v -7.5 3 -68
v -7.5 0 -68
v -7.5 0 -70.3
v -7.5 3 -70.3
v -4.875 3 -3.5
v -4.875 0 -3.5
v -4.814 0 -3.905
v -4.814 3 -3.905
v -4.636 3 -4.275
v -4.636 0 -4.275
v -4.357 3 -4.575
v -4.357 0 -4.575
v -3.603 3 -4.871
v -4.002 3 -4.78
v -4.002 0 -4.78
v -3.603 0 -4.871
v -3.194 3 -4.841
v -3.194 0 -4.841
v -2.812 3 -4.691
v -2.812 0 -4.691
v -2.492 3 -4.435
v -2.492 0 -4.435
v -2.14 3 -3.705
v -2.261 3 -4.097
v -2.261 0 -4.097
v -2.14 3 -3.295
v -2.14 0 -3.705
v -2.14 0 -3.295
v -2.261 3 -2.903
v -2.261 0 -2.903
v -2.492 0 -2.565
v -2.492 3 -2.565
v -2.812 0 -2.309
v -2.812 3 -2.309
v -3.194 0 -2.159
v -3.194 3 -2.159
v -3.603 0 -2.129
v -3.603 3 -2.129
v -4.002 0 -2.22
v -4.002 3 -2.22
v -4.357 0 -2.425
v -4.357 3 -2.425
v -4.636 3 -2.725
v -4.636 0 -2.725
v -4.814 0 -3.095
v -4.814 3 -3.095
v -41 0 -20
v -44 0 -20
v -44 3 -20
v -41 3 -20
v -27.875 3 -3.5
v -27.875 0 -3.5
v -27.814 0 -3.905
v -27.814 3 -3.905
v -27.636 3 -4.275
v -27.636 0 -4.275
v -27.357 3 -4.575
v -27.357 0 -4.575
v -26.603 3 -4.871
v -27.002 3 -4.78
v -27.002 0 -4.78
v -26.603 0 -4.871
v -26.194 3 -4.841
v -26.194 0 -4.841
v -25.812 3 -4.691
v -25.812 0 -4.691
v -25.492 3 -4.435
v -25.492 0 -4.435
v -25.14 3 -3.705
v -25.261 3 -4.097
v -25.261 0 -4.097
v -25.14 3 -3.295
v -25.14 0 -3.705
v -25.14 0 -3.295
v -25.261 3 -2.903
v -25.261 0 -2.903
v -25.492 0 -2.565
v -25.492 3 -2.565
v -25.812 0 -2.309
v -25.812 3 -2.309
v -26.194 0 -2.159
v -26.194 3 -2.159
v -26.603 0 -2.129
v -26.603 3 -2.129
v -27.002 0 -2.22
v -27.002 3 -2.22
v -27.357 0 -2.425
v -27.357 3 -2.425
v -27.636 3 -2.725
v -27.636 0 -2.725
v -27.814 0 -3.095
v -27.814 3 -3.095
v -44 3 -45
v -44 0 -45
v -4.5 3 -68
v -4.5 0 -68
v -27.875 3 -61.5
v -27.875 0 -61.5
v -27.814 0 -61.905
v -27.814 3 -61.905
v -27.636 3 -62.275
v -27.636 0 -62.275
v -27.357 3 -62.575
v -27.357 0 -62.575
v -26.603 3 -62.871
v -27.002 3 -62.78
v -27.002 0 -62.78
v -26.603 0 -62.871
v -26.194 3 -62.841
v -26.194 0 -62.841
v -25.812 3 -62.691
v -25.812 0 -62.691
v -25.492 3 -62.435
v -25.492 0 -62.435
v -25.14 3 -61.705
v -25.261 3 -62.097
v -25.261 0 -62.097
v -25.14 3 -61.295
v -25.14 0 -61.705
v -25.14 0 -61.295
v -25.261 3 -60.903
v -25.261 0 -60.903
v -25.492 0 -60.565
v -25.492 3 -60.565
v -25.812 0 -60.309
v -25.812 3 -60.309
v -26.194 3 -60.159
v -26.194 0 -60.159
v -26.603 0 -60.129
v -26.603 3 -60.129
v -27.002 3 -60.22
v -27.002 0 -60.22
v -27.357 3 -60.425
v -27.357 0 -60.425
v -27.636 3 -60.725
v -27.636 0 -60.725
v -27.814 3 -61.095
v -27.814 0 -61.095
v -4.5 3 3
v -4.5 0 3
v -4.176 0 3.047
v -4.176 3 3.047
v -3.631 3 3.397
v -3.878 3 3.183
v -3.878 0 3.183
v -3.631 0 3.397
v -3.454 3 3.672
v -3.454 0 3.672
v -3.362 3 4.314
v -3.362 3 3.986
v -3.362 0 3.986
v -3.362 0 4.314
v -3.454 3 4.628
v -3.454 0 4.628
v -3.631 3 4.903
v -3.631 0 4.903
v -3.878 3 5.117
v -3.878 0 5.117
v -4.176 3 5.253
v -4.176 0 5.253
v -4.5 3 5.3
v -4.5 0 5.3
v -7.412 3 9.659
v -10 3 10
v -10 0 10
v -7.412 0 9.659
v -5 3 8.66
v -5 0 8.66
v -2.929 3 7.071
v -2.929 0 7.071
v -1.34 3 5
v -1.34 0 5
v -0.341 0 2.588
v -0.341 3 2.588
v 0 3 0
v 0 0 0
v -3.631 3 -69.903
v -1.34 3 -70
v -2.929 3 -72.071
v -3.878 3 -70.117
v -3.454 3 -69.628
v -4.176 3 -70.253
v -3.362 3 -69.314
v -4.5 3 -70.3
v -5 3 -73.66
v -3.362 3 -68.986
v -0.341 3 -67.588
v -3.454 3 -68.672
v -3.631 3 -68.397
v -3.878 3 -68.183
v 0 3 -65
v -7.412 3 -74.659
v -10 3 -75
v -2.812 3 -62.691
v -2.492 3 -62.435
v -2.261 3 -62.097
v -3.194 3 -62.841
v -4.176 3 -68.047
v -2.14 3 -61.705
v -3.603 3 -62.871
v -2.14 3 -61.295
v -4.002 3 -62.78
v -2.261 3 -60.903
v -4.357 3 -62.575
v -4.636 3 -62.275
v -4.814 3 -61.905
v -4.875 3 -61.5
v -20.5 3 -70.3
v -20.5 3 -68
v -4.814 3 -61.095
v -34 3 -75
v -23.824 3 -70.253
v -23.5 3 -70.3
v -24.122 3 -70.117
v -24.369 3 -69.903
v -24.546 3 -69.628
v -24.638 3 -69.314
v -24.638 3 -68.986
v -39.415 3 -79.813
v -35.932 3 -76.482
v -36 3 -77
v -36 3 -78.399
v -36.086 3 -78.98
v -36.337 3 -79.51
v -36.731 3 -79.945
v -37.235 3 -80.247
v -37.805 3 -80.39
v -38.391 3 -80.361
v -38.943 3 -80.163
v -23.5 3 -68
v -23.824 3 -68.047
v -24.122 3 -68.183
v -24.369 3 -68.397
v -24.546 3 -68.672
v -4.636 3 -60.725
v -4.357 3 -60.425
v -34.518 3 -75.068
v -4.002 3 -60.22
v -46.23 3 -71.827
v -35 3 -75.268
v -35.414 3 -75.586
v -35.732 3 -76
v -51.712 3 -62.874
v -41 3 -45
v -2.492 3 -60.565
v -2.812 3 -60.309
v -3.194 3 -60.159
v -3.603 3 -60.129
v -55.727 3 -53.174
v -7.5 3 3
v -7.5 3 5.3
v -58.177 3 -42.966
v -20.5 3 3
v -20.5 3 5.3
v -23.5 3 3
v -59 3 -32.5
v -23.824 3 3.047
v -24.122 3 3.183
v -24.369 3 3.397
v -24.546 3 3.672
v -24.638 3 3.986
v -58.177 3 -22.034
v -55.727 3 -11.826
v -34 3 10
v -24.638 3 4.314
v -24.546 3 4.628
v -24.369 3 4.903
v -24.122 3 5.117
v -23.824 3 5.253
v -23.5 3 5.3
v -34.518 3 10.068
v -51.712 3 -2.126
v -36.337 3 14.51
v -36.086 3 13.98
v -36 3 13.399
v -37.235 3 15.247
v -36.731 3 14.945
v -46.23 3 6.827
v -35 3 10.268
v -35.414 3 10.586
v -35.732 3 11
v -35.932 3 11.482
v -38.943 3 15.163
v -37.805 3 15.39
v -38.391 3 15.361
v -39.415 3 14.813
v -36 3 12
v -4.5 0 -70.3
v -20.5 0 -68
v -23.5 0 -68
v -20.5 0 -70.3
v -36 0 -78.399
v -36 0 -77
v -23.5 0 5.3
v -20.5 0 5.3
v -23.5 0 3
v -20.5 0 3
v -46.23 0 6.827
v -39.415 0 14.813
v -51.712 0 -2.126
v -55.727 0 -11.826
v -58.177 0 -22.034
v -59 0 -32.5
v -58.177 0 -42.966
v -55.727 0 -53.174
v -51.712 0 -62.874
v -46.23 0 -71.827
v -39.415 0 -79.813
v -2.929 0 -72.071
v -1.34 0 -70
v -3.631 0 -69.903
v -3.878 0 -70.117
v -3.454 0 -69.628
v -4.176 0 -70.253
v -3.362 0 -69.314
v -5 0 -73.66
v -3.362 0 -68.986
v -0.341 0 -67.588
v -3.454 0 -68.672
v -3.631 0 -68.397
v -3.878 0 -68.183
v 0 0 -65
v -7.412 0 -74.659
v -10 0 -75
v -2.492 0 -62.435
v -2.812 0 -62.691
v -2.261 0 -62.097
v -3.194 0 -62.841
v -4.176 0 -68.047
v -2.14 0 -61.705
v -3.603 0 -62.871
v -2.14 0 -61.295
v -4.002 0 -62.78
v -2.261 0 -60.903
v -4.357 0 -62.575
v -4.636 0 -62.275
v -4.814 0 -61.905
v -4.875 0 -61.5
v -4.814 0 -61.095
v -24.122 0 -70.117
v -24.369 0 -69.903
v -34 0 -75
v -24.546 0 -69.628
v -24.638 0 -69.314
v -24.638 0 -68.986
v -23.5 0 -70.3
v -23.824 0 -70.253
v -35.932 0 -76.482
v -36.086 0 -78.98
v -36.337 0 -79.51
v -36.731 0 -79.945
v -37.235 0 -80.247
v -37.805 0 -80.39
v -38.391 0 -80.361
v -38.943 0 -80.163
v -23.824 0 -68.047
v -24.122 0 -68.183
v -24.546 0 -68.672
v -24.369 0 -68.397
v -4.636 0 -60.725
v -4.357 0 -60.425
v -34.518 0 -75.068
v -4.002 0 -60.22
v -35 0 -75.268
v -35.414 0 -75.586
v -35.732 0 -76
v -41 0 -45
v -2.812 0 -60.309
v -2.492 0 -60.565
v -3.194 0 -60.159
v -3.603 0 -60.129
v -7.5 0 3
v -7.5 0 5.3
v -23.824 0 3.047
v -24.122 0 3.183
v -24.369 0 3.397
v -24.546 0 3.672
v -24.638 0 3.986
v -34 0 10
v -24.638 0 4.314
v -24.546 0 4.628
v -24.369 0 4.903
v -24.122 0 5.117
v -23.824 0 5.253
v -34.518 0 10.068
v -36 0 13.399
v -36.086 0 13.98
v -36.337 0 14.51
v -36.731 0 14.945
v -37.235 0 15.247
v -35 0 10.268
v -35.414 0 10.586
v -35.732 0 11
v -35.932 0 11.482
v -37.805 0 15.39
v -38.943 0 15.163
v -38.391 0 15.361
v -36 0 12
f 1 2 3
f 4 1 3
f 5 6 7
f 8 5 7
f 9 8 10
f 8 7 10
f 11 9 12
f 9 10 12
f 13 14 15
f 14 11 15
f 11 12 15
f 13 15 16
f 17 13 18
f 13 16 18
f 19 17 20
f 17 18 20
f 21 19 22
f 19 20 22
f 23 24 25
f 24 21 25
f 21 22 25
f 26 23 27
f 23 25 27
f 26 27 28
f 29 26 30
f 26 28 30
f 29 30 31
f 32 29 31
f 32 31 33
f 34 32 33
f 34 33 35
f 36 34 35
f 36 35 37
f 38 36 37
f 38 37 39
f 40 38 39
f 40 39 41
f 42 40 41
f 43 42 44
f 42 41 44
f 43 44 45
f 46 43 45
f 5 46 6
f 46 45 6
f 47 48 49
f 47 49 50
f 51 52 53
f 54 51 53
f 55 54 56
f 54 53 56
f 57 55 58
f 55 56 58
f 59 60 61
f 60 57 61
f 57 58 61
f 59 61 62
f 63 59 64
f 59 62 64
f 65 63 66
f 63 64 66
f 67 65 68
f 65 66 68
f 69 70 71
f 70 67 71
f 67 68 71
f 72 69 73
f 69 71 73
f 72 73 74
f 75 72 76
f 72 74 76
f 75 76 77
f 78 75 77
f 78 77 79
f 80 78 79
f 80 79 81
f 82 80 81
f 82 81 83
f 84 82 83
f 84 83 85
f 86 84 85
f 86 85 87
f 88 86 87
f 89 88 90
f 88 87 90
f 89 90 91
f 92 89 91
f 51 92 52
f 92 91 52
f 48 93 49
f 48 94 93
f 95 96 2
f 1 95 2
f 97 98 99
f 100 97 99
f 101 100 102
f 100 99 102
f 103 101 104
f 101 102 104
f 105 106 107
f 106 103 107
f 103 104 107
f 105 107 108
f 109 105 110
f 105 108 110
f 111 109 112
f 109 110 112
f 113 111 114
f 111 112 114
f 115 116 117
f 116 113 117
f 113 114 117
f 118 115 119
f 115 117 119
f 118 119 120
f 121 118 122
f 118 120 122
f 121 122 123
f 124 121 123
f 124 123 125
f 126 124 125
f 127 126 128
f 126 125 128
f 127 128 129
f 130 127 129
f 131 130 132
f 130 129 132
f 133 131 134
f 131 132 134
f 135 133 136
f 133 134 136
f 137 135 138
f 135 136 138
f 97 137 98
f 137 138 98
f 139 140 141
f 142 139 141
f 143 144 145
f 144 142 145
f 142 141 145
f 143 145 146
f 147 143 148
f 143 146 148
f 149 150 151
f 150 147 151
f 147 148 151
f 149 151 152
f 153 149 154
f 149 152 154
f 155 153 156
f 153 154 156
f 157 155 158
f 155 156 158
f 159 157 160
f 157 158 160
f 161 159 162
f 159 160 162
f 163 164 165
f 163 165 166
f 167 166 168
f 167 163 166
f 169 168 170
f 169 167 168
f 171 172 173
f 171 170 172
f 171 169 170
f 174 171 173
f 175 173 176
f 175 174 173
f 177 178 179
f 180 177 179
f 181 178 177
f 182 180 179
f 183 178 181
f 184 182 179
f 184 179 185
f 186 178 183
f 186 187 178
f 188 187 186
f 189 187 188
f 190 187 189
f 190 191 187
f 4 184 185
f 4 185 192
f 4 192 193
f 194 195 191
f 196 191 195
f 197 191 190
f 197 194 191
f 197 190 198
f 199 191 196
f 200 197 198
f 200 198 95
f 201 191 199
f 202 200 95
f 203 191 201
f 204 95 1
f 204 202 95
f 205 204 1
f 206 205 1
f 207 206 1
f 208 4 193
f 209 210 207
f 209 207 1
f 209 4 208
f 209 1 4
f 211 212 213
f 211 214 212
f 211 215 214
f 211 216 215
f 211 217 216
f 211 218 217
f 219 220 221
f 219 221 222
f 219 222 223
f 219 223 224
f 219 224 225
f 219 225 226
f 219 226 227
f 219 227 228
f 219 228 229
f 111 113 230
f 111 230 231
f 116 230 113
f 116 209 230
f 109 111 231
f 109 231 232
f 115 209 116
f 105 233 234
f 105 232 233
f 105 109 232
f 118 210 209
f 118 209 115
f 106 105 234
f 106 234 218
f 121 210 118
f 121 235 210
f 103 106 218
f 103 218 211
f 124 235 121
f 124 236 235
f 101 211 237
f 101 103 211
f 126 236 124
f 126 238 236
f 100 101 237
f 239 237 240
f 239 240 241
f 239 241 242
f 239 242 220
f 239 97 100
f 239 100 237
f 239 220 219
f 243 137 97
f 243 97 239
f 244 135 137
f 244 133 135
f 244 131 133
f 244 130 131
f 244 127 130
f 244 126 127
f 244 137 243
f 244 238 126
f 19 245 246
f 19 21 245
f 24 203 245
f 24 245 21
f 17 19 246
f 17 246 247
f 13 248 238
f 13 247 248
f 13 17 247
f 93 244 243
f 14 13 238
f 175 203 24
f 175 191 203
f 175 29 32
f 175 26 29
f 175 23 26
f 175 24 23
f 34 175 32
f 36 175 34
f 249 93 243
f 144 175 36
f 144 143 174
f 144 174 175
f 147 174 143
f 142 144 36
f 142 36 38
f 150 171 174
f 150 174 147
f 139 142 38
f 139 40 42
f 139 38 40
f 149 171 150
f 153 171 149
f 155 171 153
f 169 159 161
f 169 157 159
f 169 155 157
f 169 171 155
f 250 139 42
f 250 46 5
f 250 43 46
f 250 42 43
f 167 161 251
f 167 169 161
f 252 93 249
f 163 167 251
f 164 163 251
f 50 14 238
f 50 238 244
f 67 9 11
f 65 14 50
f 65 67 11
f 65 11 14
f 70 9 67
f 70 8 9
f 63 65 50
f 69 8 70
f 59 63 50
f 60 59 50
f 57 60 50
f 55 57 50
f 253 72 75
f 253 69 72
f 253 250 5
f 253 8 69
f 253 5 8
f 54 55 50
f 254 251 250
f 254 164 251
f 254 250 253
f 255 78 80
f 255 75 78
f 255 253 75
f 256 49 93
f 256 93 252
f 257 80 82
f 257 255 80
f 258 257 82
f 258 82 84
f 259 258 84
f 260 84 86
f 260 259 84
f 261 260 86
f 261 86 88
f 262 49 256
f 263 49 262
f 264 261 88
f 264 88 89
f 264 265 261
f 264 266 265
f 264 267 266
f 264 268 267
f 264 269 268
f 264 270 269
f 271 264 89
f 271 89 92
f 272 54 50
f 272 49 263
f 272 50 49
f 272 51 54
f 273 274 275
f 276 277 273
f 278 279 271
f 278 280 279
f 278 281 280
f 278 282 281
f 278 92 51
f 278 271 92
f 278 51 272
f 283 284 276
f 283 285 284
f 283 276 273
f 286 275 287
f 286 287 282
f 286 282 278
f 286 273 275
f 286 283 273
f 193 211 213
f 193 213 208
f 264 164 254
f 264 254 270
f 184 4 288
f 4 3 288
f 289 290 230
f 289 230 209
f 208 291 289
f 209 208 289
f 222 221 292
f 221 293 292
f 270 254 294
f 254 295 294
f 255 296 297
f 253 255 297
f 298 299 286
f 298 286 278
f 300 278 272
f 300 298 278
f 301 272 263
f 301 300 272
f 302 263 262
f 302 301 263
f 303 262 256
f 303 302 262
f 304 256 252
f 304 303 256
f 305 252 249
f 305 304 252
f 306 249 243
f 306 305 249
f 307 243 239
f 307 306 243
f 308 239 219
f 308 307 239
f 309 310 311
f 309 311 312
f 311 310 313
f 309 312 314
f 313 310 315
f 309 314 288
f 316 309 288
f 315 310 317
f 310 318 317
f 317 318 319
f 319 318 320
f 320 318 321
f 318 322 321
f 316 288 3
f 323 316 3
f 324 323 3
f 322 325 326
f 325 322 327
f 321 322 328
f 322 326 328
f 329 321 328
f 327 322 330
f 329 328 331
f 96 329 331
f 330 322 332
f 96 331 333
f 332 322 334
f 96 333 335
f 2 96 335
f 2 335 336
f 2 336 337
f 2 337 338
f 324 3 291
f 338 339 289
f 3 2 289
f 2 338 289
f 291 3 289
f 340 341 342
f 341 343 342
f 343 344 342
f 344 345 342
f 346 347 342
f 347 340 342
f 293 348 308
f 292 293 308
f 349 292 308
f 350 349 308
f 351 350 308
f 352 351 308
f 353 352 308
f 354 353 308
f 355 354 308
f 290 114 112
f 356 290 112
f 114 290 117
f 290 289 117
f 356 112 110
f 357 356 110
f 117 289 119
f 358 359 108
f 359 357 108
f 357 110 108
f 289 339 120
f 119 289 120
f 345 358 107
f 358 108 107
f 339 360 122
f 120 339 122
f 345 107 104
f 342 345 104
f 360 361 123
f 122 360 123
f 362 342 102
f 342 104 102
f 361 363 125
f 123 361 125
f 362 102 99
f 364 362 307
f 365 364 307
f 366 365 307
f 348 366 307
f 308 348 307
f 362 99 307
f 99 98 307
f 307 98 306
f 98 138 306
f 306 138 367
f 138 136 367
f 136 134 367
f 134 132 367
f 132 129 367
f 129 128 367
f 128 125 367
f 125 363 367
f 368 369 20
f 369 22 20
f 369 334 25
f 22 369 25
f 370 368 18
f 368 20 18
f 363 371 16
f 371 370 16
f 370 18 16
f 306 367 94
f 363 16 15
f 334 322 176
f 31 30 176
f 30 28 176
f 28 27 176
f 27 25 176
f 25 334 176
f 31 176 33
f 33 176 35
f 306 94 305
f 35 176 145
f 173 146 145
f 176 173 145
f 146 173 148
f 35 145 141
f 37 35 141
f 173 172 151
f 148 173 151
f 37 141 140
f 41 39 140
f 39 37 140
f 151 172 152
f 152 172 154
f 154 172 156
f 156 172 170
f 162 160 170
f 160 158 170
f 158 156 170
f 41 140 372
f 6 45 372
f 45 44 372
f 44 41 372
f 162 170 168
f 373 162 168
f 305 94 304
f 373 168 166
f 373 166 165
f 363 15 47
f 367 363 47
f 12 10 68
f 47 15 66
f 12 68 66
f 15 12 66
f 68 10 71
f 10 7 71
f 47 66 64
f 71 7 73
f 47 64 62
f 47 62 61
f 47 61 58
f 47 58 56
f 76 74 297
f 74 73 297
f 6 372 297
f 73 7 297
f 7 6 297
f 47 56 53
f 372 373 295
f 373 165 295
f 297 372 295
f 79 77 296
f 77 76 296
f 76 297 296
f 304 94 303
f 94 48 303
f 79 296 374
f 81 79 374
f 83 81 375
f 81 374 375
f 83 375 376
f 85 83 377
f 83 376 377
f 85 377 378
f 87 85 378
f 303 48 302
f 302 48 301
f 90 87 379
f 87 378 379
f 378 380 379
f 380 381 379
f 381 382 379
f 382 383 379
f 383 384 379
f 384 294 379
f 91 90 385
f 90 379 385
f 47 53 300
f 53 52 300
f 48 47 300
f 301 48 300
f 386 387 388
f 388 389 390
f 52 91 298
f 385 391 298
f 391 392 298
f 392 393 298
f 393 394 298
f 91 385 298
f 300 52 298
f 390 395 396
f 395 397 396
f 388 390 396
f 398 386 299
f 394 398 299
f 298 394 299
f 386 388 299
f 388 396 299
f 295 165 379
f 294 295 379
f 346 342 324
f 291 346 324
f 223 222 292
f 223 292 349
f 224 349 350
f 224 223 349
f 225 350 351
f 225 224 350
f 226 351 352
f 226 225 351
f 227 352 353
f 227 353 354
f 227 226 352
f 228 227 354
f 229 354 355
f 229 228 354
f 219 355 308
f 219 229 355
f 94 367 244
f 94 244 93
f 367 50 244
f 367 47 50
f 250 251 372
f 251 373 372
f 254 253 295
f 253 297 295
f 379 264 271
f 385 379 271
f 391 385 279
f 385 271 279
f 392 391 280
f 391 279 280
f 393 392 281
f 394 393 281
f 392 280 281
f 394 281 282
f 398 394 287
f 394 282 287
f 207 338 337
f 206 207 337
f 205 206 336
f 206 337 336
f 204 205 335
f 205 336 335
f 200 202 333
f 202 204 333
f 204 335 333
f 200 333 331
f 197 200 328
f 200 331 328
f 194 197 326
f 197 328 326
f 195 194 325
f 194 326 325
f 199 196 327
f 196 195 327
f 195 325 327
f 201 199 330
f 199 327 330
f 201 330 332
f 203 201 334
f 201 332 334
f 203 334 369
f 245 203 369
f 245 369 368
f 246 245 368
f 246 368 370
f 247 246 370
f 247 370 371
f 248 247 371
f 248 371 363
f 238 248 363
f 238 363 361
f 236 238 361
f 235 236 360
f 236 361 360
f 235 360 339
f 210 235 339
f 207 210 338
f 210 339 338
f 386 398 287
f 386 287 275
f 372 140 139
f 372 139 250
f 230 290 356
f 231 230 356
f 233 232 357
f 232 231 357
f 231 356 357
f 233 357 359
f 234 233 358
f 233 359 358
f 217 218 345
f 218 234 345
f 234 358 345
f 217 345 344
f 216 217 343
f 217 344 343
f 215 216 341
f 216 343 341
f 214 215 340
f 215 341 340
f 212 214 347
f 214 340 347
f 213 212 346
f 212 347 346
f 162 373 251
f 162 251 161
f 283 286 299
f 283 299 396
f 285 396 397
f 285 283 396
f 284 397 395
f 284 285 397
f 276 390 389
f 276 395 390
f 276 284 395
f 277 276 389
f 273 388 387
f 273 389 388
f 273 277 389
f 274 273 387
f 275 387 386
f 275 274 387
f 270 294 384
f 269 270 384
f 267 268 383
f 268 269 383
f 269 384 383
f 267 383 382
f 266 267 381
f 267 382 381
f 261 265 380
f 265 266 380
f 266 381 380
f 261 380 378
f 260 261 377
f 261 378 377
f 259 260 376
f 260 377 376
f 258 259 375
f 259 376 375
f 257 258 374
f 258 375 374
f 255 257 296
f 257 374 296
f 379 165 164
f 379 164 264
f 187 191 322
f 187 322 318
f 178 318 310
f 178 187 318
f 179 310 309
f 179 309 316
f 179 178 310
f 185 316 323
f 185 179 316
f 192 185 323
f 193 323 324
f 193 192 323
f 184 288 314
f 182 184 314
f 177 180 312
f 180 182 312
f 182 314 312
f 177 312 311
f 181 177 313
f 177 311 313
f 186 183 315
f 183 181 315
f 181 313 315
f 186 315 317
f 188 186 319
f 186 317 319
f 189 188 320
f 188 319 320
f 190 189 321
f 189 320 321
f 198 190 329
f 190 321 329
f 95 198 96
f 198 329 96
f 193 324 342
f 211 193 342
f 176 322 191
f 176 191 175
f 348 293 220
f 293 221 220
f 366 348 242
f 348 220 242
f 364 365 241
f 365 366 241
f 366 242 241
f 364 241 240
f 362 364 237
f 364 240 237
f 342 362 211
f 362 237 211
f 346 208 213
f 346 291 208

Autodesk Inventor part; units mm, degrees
ref_plane "YZ Plane" through (0, 0, 0) normal (1, 0, 0) x (0, 1, 0)
ref_plane "XZ Plane" through (0, 0, 0) normal (0, 1, 0) x (-1, 0, 0)
ref_plane "XY Plane" through (0, 0, 0) normal (0, 0, 1) x (1, 0, 0)
sketch "Boceto1" plane through (0, 0, 0) normal (0, 1, 0) x (-1, 0, 0)
  line L0 (3, 0) -> (33, 0)
  line L1 (36, -3) -> (36, -62)
  line L2 (33, -65) -> (3, -65)
  line L3 (0, -62) -> (0, -3)
  circle A0 centre (3.5, -61.5) radius 1.375
  arc A1 (36, -3) -> (33, 0) centre (33, -3) ccw
  arc A2 (3, 0) -> (0, -3) centre (3, -3) ccw
  arc A3 (0, -62) -> (3, -65) centre (3, -62) ccw
  arc A4 (33, -65) -> (36, -62) centre (33, -62) ccw
  circle A5 centre (26.5, -61.5) radius 1.375
  circle A6 centre (3.5, -3.5) radius 1.375
  circle A7 centre (26.5, -3.5) radius 1.375
  line L4 (36, 0) -> (0, 0)
  line L5 (0, 0) -> (0, 10)
  line L6 (0, 10) -> (36, 10)
  line L7 (36, 10) -> (36, 0)
  line L8 (36, -65) -> (0, -65)
  line L9 (0, -65) -> (0, -75)
  line L10 (0, -75) -> (36, -75)
  line L11 (36, -75) -> (36, -65)
  line L12 (7.5, 0) -> (20.5, 0)
  line L13 (20.5, 0) -> (20.5, 10)
  line L14 (20.5, 10) -> (7.5, 10)
  line L15 (7.5, 10) -> (7.5, 0)
  line L16 (7.5, 0) -> (20.5, 10) construction
  line L17 (20.5, 0) -> (7.5, 10) construction
  line L18 (7.5, -75) -> (20.5, -75)
  line L19 (20.5, -75) -> (20.5, -65)
  line L20 (20.5, -65) -> (7.5, -65)
  line L21 (7.5, -65) -> (7.5, -75)
  line L22 (7.5, -75) -> (20.5, -65) construction
  line L23 (20.5, -75) -> (7.5, -65) construction
  line L24 (36, -32.5) -> (0, -32.5)
  line L25 (36, 0) -> (36, -3)
  line L26 (0, 0) -> (0, -3)
  line L27 (0, -62) -> (0, -65)
  line L28 (36, -62) -> (36, -65)
  line L29 (36, -22.5) -> (49, -22.5)
  line L30 (49, -22.5) -> (49, -42.5)
  line L31 (49, -42.5) -> (36, -42.5)
  line L32 (36, -42.5) -> (36, -22.5)
  arc A8 (49, -42.5) -> (49, -22.5) centre (49, -32.5) ccw
  line L33 (20.5, 5.3) -> (23.5, 5.3)
  line L34 (23.5, 5.3) -> (23.5, 3)
  line L35 (23.5, 3) -> (20.5, 3)
  line L36 (20.5, 3) -> (20.5, 5.3)
  arc A9 (23.5, 3) -> (23.5, 5.3) centre (23.5, 4.15) ccw
  line L37 (14, 0) -> (14, -65)
  line L38 (7.5, 5.3) -> (4.5, 5.3)
  line L39 (4.5, 5.3) -> (4.5, 3)
  line L40 (4.5, 3) -> (7.5, 3)
  line L41 (7.5, 3) -> (7.5, 5.3)
  arc A10 (4.5, 5.3) -> (4.5, 3) centre (4.5, 4.15) ccw
  line L42 (20.5, -70.3) -> (23.5, -70.3)
  line L43 (23.5, -70.3) -> (23.5, -68)
  line L44 (23.5, -68) -> (20.5, -68)
  line L45 (20.5, -68) -> (20.5, -70.3)
  arc A11 (23.5, -70.3) -> (23.5, -68) centre (23.5, -69.15) ccw
  line L46 (4.5, -68) -> (7.5, -68)
  arc A12 (4.5, -68) -> (4.5, -70.3) centre (4.5, -69.15) ccw
  line L47 (7.5, -70.3) -> (4.5, -70.3)
  line L48 (4.5, -70.3) -> (4.5, -68)
  line L49 (7.5, -68) -> (7.5, -70.3)
  line L50 (36, 0) -> (49, 0)
  line L51 (49, 0) -> (49, -65)
  line L52 (49, -65) -> (36, -65)
  line L53 (36, -65) -> (36, 0)
  line L54 (44, -20) -> (41, -20)
  line L55 (41, -20) -> (41, -45)
  line L56 (41, -45) -> (44, -45)
  line L57 (44, -45) -> (44, -20)
  line L58 (36, 10) -> (36, 18)
  line L59 (36, -75) -> (36, -83)
  arc A13 (36, -83) -> (36, 18) centre (-7.9402, -32.5) ccw
  line L60 (0, -75) -> (-7, -75)
  line L61 (-7, -75) -> (-7, 10)
  line L62 (-7, 10) -> (0, 10)
  line L63 (0, 10) -> (0, -75)
  point P0 (14, 5)
  point P1 (14, -70)
  point P2 (36, -42.5)
  point P3 (7.5, -70.3)
  point P4 (20.5, -70.3)
  point P5 (7.5, 5.3)
  point P6 (20.5, 3)
  point P7 (44, -32.5)
  point P8 (36, -65)
  point P9 (44, -42.5)
  point P10 (41, -42.5)
  point P11 (41, -22.5)
  point P12 (44, -22.5)
  point P13 (49, -22.5)
  point P14 (59, -32.5)
  dimension "d0" = 36
  dimension "d1" = 65
  dimension "d2" = 2.75
  dimension "d3" = 3
  dimension "d4" = 3
  dimension "d5" = 3
  dimension "d6" = 3
  dimension "d7" = 3.5
  dimension "d8" = 3.5
  dimension "d11" = 23
  dimension "d14" = 58
  dimension "d17" = 10
  dimension "d18" = 10
  dimension "d19" = 13
  dimension "d20" = 10
  dimension "d21" = 13
  dimension "d22" = 10
  dimension "d26" = 7.5
  dimension "d30" = 20
  dimension "d31" = 13
  dimension "d32" = 3
  dimension "d33" = 2.3
  dimension "d34" = 3
  dimension "d35" = 1.15
  dimension "d36" = 13
  dimension "d37" = 3
  dimension "d38" = 25
  dimension "d39" = 5
  dimension "d42" = 8
  dimension "d43" = 8
  dimension "d46" = 7
extrude "Extrusión1" add sketch "Boceto1" along normal blind 3 contours L4 L5 L6 L15 L38 A10 L40 L0 | L0 L37 L24 L3 A2 | A2 L26 L4 | L15 L6 L13 L0 | L0 A1 L1 L24 L37 | L24 L37 L2 A3 L3 | L13 L35 A9 L33 L6 L7 L4 L0 | L24 L1 A4 L2 L37 | A3 L8 L27 | L4 L25 A1 | L1 L29 L55 L31 | L2 L19 L10 L21 | L2 L21 L46 A12 L47 L10 L9 L8 | L25 L50 L51 L29 L57 L54 L55 L1 | L7 L58 A13 A8 L51 L50 | L31 L55 L56 L57 L51 L52 L28 L1 | L2 L8 L11 L10 L19 L42 A11 L44 | L29 L57 L31 L55 | L28 L8 A4 | L30 L31 L57 L29 | A8 L30 | L52 L51 A8 A13 L59 L11
fillet "Empalme1" radius 10 2 edges at (0, 1.5, -75) (0, 1.5, 10)
extrude "Extrusión2" cut sketch "Boceto1" along normal blind 3 contours L29 L57 L31 L55
fillet "Empalme2" radius 2 4 edges at (-36, 1.5, -83) (-36, 1.5, 18) (-36, 1.5, 10) (-36, 1.5, -75)
equation "\"d18\" = d17"
equation "\"d21\" = d19"
equation "\"d22\" = d20"
equation "\"d36\" = d31"
properties part number "Parte inferior"
